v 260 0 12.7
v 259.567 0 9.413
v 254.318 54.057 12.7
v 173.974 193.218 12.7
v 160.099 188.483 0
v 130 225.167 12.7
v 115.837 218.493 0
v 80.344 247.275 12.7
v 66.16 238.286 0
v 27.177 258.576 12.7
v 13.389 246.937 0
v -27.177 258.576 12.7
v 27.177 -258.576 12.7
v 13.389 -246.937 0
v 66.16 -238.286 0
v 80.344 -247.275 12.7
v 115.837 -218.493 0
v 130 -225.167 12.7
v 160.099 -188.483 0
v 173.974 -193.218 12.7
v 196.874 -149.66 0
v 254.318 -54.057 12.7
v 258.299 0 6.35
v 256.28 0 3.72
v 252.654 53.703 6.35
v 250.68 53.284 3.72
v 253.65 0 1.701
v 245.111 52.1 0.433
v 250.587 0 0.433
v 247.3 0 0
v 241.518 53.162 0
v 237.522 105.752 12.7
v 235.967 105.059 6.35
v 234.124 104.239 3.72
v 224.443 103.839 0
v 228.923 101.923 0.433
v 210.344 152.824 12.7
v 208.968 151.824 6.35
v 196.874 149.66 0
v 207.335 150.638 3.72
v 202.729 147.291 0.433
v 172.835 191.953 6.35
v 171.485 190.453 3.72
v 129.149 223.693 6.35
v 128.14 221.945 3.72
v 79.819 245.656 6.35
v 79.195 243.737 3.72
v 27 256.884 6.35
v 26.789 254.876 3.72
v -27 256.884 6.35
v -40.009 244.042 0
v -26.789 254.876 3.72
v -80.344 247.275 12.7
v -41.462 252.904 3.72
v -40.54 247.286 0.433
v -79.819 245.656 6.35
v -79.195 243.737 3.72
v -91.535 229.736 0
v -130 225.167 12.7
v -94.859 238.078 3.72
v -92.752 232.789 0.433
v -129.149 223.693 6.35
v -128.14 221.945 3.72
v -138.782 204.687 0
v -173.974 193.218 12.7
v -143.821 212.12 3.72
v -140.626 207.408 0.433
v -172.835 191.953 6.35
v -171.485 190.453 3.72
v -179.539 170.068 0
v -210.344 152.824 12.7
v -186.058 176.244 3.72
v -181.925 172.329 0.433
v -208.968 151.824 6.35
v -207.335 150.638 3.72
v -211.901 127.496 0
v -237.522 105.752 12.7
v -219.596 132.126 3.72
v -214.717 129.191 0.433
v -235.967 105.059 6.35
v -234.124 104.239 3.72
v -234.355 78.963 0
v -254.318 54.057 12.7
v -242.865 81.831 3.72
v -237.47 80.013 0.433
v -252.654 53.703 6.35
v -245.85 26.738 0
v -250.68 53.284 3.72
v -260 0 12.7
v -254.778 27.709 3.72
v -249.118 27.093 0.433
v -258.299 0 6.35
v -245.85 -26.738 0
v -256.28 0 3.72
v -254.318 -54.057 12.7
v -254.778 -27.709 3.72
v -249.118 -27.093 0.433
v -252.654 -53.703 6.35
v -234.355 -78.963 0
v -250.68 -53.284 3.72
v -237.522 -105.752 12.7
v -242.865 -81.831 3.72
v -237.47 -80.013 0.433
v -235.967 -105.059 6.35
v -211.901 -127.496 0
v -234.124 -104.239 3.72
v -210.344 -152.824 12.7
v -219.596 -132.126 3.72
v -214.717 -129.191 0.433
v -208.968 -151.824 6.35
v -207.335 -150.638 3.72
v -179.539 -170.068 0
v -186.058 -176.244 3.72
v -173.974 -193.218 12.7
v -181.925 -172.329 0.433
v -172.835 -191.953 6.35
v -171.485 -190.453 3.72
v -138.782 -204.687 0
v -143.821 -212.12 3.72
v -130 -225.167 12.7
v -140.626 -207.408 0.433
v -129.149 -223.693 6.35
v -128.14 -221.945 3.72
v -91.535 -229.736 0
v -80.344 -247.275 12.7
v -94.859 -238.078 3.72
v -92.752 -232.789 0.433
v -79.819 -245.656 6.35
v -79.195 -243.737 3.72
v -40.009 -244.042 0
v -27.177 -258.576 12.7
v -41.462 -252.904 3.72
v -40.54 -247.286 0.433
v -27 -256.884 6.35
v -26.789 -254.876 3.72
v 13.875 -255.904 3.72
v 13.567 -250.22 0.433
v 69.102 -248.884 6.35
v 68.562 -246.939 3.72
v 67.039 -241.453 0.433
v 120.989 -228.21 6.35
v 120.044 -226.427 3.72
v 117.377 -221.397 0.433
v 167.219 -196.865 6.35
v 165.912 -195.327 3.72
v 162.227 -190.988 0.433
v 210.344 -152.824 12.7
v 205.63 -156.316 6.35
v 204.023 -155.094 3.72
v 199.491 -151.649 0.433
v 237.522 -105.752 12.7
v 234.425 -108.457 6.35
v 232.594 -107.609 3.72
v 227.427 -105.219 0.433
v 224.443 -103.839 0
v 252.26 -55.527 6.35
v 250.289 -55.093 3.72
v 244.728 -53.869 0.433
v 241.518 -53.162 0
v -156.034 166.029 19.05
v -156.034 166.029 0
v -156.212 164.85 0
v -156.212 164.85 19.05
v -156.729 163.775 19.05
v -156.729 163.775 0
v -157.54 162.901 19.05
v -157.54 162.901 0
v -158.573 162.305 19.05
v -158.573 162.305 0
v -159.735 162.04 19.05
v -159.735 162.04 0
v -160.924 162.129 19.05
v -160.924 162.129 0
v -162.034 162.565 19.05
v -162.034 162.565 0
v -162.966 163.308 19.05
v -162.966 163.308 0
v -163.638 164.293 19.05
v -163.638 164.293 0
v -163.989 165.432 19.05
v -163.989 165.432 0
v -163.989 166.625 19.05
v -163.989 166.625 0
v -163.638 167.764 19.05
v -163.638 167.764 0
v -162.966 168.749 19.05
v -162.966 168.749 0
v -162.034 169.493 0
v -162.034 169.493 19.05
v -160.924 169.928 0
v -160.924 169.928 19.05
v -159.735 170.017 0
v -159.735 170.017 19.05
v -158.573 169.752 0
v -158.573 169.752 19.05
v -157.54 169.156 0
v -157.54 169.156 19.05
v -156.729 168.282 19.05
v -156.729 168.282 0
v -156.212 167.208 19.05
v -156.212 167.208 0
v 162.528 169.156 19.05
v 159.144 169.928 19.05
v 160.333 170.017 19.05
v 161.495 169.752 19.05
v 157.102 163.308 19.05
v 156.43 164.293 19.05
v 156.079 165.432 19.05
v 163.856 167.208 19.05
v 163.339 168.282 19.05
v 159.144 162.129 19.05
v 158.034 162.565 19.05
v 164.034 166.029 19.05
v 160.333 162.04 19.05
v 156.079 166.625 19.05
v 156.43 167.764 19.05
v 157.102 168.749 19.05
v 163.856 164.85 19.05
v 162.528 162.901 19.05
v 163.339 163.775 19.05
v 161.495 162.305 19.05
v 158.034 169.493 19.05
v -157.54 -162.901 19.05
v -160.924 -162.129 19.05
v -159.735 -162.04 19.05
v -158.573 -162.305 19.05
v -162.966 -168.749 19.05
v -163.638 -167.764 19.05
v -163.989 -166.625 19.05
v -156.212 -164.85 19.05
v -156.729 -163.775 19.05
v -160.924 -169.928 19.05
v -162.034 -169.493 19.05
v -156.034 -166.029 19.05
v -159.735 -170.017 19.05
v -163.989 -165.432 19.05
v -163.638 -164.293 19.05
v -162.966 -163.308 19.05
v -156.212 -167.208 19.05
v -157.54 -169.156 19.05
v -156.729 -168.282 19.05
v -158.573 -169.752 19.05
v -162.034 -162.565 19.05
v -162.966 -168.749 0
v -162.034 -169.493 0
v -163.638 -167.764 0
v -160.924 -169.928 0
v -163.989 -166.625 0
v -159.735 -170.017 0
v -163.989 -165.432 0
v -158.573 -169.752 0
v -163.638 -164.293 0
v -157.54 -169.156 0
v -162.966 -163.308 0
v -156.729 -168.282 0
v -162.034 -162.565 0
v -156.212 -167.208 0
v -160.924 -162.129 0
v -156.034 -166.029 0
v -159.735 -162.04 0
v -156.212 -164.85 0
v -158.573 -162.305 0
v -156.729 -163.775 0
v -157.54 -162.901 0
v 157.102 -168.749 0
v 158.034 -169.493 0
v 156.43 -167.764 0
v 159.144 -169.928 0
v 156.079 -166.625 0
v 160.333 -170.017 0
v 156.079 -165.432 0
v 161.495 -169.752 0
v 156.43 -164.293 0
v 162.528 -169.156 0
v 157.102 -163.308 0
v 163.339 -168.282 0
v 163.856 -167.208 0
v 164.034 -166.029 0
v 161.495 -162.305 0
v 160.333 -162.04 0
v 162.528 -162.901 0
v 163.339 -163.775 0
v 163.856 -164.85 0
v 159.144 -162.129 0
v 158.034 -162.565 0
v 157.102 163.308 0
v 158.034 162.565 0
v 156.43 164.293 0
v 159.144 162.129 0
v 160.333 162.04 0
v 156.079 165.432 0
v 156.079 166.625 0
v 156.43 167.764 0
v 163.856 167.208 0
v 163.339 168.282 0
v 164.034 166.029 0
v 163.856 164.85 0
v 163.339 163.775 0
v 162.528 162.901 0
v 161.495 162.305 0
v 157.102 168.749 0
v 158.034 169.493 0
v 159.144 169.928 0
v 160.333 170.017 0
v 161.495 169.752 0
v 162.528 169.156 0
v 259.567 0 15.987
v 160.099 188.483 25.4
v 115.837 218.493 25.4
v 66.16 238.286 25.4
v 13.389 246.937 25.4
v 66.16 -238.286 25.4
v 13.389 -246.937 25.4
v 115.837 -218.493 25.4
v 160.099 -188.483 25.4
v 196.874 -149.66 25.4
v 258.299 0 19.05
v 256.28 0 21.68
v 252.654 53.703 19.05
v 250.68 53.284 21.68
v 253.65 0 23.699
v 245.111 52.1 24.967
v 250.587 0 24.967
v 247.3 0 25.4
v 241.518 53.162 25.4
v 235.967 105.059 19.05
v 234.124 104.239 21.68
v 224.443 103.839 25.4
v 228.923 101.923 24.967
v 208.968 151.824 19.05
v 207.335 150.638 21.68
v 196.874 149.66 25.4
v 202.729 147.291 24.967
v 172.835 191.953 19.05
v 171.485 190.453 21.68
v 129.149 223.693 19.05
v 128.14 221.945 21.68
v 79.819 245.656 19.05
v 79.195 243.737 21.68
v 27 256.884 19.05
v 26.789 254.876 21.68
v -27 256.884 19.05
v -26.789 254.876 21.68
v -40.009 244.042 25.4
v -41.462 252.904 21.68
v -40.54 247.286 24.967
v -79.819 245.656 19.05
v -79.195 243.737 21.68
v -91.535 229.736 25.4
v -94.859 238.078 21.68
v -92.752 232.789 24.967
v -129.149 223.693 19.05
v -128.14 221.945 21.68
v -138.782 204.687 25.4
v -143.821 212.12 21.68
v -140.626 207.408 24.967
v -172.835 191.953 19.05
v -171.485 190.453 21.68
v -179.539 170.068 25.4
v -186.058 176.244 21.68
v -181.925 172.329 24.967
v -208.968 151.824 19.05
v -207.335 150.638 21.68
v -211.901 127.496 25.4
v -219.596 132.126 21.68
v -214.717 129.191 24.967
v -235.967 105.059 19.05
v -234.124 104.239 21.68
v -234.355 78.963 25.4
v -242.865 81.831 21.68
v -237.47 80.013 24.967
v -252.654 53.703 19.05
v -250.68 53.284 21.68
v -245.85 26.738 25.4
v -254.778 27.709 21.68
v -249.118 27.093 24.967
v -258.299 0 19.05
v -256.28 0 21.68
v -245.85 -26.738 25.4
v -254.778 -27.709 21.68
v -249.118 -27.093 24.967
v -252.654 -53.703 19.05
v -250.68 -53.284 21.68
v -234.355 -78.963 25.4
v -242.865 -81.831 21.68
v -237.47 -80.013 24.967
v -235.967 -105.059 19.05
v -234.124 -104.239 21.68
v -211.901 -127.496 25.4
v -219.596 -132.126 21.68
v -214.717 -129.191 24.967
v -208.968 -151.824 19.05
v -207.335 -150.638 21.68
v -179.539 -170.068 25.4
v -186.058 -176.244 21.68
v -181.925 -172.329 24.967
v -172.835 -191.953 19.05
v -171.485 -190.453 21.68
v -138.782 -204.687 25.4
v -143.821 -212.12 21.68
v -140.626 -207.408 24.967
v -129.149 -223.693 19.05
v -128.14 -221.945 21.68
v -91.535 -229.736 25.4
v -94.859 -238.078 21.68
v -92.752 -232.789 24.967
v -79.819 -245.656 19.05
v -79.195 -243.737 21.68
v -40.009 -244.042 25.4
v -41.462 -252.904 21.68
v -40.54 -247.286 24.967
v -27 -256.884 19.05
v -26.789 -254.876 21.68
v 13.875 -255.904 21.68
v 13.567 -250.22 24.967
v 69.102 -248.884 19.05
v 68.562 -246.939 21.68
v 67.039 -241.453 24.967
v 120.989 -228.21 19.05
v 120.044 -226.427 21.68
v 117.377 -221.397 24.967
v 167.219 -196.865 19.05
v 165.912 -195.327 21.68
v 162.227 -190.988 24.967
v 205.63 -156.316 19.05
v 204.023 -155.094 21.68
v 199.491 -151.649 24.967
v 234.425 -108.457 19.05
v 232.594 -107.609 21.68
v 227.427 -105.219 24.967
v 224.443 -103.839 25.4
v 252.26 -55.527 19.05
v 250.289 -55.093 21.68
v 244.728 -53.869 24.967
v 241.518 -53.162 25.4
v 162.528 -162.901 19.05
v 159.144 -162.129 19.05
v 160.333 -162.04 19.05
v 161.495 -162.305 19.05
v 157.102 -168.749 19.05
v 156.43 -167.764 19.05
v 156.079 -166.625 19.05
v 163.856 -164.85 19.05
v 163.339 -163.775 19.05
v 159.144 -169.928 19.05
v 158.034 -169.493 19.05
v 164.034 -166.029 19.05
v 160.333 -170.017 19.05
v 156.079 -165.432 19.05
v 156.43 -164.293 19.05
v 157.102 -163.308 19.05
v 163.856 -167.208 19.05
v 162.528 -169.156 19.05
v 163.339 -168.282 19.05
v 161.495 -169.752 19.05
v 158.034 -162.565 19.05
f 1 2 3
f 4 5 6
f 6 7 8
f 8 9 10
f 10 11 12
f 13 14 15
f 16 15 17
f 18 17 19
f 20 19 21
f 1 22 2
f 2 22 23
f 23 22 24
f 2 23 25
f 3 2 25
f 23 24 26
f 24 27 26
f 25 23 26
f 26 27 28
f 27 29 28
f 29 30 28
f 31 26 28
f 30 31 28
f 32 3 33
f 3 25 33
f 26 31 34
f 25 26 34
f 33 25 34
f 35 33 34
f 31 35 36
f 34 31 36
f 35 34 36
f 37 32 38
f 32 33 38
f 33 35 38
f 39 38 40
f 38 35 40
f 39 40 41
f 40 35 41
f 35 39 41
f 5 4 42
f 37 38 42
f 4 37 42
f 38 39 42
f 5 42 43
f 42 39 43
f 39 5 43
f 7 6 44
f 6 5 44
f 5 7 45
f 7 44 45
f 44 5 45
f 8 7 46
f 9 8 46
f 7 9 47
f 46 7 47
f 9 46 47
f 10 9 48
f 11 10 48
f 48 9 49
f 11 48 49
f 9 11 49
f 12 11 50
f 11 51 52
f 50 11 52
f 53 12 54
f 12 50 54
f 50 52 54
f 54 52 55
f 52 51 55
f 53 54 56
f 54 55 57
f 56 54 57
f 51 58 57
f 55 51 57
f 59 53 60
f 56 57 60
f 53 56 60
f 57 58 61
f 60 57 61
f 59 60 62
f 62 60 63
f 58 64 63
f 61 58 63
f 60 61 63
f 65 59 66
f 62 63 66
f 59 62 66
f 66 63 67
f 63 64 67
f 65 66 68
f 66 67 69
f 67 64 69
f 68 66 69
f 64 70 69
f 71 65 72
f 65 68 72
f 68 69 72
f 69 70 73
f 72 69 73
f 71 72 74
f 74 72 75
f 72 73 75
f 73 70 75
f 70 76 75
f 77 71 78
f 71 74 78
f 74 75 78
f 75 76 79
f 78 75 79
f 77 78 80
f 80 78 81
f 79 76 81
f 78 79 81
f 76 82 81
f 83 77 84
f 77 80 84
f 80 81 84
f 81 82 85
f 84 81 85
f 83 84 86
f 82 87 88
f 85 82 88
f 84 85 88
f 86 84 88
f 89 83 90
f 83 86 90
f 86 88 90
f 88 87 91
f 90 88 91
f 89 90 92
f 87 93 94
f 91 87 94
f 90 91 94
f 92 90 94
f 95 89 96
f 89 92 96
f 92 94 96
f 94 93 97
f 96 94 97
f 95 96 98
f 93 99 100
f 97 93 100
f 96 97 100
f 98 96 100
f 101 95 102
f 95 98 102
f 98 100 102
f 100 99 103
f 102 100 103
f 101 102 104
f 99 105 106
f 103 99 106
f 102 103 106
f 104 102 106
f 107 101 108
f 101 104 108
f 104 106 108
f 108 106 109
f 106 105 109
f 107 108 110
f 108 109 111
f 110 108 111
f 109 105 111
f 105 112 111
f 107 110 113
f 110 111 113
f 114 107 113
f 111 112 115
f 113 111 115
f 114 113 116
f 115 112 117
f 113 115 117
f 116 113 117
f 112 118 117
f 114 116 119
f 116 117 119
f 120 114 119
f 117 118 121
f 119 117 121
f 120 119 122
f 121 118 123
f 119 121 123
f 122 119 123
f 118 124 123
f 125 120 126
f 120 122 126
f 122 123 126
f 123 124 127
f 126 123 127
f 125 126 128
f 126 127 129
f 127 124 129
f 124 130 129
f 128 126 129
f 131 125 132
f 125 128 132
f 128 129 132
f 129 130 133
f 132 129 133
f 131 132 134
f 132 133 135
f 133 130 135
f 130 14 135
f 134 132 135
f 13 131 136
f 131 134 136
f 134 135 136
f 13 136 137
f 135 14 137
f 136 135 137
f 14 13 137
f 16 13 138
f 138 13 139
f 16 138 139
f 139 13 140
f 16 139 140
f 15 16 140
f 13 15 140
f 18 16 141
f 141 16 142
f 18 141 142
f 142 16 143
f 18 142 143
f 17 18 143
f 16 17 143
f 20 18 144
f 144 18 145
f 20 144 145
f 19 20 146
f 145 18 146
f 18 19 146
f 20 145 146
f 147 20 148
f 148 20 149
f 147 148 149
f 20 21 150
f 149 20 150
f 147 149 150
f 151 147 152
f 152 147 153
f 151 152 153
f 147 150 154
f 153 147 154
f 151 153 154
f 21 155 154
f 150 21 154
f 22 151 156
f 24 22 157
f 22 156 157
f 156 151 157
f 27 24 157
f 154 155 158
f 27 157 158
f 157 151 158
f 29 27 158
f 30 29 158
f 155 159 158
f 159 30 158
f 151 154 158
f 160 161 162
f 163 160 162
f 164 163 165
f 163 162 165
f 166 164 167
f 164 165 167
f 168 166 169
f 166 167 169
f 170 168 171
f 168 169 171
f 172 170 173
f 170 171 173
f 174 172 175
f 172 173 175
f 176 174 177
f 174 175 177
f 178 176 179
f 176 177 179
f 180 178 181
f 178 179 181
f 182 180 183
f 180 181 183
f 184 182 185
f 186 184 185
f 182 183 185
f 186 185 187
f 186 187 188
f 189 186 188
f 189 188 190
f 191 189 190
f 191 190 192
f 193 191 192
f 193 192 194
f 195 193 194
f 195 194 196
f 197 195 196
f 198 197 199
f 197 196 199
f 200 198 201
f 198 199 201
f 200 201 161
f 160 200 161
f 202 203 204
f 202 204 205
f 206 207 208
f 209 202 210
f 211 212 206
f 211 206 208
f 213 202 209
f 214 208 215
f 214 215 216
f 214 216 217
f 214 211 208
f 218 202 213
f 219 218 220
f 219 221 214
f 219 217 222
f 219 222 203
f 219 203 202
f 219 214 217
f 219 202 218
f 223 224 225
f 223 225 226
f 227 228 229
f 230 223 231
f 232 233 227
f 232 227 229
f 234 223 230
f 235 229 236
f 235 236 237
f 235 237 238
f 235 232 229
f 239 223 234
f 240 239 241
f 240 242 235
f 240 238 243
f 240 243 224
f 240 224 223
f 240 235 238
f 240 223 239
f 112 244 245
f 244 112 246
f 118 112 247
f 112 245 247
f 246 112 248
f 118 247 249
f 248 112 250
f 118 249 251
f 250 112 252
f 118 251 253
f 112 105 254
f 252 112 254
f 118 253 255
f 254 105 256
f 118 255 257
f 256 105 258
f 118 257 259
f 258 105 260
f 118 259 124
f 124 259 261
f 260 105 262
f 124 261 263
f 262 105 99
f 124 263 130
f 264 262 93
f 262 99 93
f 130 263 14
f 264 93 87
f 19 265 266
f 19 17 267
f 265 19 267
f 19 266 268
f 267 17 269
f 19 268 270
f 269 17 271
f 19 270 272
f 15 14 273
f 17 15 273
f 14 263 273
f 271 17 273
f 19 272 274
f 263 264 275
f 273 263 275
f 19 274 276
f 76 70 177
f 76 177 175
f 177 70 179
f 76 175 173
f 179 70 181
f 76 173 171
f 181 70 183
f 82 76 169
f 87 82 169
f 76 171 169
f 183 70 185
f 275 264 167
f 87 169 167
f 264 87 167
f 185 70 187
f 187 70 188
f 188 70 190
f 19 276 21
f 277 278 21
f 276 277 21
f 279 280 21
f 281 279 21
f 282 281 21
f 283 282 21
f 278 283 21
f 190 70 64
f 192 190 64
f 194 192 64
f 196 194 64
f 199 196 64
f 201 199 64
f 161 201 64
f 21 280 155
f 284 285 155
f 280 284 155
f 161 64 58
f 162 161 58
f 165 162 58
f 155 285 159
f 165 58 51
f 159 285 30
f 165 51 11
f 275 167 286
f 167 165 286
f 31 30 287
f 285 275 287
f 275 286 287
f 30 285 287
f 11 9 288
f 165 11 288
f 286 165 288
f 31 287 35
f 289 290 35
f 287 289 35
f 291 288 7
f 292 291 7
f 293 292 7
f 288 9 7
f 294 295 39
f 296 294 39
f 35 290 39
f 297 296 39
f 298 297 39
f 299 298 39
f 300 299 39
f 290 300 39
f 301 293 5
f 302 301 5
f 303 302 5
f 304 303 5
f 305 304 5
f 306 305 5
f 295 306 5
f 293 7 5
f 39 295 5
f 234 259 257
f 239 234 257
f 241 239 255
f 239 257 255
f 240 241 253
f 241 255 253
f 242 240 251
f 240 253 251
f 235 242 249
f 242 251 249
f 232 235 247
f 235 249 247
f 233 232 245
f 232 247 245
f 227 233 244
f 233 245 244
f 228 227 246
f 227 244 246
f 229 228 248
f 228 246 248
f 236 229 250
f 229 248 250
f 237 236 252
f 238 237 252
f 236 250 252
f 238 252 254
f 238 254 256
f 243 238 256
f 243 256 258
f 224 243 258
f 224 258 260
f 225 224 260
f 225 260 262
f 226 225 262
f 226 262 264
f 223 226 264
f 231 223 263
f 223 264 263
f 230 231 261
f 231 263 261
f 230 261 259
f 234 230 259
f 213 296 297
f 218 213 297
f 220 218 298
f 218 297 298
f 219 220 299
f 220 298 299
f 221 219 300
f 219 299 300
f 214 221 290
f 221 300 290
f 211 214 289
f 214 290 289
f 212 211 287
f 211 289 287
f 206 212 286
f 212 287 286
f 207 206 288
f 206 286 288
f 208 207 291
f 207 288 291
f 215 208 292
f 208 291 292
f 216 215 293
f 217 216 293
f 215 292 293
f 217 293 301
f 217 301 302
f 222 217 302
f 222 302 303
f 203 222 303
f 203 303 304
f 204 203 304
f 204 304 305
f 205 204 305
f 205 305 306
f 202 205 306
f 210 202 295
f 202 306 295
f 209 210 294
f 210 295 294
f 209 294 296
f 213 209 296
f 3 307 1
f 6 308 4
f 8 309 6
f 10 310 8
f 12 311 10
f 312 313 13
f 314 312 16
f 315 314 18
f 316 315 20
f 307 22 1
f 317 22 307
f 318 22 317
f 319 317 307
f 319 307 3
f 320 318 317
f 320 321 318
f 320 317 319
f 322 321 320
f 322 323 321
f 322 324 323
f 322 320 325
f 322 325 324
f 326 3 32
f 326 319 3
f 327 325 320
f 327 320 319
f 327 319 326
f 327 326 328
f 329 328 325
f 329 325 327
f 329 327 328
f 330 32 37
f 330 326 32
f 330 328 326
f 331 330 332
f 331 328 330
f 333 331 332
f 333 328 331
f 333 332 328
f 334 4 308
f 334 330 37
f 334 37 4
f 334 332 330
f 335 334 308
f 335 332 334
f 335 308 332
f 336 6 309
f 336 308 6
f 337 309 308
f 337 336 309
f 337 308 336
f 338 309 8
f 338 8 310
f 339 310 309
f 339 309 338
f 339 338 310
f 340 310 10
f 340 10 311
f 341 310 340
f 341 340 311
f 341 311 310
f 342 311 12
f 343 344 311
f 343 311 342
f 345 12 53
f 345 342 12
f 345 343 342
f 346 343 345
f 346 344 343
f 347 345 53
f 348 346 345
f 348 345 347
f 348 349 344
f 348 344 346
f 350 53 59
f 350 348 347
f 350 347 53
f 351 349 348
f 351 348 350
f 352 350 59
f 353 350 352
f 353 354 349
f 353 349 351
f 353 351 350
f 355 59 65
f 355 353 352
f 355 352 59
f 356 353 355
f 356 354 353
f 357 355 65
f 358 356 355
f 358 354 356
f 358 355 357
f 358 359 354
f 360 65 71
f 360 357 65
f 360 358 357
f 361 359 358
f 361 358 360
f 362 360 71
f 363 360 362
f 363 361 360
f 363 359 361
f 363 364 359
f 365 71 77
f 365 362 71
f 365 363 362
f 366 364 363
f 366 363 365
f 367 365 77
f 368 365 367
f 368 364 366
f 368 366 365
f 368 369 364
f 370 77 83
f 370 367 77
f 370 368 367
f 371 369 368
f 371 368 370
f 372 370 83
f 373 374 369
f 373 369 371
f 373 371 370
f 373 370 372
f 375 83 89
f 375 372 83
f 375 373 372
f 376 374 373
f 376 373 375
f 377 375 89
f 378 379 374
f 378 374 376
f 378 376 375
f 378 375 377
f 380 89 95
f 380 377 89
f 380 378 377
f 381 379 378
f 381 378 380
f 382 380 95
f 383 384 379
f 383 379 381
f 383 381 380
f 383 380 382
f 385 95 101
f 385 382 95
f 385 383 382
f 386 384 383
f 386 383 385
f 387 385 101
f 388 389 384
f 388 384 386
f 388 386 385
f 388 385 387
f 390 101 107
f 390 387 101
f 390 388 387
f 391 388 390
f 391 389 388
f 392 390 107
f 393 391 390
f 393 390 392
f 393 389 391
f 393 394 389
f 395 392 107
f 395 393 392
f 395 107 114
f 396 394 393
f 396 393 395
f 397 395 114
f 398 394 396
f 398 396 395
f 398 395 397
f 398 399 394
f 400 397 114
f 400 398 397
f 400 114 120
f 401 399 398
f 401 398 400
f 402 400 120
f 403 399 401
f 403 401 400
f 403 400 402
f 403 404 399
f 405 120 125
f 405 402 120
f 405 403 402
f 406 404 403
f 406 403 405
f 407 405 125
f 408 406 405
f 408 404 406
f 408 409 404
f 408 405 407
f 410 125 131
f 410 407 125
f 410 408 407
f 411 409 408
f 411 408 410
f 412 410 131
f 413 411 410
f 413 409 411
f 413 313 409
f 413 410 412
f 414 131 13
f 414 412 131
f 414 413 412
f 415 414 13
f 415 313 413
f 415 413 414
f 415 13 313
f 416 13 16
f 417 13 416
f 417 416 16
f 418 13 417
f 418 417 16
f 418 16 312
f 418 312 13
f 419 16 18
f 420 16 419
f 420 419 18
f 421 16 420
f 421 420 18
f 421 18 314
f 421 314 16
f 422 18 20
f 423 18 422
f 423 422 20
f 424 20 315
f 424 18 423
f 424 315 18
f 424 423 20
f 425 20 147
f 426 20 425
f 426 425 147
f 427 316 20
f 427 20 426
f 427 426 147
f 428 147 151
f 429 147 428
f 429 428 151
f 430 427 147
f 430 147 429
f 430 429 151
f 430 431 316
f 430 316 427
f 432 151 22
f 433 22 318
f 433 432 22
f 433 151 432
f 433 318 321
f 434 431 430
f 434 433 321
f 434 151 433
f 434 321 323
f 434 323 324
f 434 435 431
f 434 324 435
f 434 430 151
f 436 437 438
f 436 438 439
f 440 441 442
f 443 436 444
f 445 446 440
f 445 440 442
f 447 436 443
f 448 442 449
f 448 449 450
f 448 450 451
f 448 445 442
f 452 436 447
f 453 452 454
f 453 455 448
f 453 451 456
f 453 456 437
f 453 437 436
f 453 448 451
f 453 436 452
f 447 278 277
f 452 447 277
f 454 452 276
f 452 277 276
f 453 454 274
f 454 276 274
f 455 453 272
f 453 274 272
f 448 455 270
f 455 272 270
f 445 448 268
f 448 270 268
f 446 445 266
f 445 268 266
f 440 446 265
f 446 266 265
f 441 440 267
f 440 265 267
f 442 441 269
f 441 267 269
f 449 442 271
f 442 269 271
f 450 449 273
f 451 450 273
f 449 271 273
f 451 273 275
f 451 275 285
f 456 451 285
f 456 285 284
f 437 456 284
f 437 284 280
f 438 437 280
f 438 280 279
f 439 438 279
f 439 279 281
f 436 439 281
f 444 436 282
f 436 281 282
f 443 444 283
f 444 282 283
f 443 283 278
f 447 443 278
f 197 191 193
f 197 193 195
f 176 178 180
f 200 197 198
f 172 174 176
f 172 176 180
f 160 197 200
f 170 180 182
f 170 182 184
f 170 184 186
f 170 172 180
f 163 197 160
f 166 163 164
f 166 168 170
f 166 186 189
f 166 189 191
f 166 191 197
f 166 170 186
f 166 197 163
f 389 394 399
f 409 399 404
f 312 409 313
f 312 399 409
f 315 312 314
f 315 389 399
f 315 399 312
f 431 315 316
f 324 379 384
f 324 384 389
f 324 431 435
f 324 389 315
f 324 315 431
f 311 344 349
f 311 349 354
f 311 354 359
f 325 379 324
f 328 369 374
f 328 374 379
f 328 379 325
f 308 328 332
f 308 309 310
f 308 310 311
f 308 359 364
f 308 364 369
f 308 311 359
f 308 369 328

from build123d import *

# Parameters (mm, degrees)
F0_R     = 260
F1_DEPTH = 25.4
F2_R     = 12.69999
F3_R     = 4
F4_DEPTH = 19.05
F5_DEPTH = 19.05


# Not quite as in the source:
# - a fillet or chamfer is up to 0.001 mm smaller than in the source, because OpenCascade refuses the exact size


with BuildPart() as f1:
    # F0 (on Top) → F1 (new body)
    with BuildSketch(Plane.XY):
        Circle(F0_R)
    extrude(amount=F1_DEPTH)

    # F2 (radius 12.7 in the source; OpenCascade refuses exactly that, so slightly less here)
    f2_edges = [f1.edges().sort_by_distance(p)[0] for p in [
        (-260, 0, 25.4),
        (-260, 0, 0),
    ]]
    fillet(f2_edges, radius=F2_R)

    # F3 (on face) → F4 (cut)
    with BuildSketch(Plane(origin=(0, 0, 0), x_dir=(1, 0, 0), z_dir=(0, 0, -1))):
        with Locations((160.0338797814, 166.028664158)):
            Circle(F3_R)
    extrude(amount=-F4_DEPTH, mode=Mode.SUBTRACT)

    # F3 (on face) → F5 (cut)
    with BuildSketch(Plane(origin=(0, 0, 0), x_dir=(1, 0, 0), z_dir=(0, 0, -1))):
        with Locations((-160.0338797814, 166.028664158)):
            Circle(F3_R)
        with Locations((160.0338797814, 166.028664158)):
            Circle(F3_R)
        with Locations((160.0338797814, -166.028664158)):
            Circle(F3_R)
        with Locations((-160.0338797814, -166.028664158)):
            Circle(F3_R)
    extrude(amount=-F5_DEPTH, mode=Mode.SUBTRACT)


solid = f1.part
